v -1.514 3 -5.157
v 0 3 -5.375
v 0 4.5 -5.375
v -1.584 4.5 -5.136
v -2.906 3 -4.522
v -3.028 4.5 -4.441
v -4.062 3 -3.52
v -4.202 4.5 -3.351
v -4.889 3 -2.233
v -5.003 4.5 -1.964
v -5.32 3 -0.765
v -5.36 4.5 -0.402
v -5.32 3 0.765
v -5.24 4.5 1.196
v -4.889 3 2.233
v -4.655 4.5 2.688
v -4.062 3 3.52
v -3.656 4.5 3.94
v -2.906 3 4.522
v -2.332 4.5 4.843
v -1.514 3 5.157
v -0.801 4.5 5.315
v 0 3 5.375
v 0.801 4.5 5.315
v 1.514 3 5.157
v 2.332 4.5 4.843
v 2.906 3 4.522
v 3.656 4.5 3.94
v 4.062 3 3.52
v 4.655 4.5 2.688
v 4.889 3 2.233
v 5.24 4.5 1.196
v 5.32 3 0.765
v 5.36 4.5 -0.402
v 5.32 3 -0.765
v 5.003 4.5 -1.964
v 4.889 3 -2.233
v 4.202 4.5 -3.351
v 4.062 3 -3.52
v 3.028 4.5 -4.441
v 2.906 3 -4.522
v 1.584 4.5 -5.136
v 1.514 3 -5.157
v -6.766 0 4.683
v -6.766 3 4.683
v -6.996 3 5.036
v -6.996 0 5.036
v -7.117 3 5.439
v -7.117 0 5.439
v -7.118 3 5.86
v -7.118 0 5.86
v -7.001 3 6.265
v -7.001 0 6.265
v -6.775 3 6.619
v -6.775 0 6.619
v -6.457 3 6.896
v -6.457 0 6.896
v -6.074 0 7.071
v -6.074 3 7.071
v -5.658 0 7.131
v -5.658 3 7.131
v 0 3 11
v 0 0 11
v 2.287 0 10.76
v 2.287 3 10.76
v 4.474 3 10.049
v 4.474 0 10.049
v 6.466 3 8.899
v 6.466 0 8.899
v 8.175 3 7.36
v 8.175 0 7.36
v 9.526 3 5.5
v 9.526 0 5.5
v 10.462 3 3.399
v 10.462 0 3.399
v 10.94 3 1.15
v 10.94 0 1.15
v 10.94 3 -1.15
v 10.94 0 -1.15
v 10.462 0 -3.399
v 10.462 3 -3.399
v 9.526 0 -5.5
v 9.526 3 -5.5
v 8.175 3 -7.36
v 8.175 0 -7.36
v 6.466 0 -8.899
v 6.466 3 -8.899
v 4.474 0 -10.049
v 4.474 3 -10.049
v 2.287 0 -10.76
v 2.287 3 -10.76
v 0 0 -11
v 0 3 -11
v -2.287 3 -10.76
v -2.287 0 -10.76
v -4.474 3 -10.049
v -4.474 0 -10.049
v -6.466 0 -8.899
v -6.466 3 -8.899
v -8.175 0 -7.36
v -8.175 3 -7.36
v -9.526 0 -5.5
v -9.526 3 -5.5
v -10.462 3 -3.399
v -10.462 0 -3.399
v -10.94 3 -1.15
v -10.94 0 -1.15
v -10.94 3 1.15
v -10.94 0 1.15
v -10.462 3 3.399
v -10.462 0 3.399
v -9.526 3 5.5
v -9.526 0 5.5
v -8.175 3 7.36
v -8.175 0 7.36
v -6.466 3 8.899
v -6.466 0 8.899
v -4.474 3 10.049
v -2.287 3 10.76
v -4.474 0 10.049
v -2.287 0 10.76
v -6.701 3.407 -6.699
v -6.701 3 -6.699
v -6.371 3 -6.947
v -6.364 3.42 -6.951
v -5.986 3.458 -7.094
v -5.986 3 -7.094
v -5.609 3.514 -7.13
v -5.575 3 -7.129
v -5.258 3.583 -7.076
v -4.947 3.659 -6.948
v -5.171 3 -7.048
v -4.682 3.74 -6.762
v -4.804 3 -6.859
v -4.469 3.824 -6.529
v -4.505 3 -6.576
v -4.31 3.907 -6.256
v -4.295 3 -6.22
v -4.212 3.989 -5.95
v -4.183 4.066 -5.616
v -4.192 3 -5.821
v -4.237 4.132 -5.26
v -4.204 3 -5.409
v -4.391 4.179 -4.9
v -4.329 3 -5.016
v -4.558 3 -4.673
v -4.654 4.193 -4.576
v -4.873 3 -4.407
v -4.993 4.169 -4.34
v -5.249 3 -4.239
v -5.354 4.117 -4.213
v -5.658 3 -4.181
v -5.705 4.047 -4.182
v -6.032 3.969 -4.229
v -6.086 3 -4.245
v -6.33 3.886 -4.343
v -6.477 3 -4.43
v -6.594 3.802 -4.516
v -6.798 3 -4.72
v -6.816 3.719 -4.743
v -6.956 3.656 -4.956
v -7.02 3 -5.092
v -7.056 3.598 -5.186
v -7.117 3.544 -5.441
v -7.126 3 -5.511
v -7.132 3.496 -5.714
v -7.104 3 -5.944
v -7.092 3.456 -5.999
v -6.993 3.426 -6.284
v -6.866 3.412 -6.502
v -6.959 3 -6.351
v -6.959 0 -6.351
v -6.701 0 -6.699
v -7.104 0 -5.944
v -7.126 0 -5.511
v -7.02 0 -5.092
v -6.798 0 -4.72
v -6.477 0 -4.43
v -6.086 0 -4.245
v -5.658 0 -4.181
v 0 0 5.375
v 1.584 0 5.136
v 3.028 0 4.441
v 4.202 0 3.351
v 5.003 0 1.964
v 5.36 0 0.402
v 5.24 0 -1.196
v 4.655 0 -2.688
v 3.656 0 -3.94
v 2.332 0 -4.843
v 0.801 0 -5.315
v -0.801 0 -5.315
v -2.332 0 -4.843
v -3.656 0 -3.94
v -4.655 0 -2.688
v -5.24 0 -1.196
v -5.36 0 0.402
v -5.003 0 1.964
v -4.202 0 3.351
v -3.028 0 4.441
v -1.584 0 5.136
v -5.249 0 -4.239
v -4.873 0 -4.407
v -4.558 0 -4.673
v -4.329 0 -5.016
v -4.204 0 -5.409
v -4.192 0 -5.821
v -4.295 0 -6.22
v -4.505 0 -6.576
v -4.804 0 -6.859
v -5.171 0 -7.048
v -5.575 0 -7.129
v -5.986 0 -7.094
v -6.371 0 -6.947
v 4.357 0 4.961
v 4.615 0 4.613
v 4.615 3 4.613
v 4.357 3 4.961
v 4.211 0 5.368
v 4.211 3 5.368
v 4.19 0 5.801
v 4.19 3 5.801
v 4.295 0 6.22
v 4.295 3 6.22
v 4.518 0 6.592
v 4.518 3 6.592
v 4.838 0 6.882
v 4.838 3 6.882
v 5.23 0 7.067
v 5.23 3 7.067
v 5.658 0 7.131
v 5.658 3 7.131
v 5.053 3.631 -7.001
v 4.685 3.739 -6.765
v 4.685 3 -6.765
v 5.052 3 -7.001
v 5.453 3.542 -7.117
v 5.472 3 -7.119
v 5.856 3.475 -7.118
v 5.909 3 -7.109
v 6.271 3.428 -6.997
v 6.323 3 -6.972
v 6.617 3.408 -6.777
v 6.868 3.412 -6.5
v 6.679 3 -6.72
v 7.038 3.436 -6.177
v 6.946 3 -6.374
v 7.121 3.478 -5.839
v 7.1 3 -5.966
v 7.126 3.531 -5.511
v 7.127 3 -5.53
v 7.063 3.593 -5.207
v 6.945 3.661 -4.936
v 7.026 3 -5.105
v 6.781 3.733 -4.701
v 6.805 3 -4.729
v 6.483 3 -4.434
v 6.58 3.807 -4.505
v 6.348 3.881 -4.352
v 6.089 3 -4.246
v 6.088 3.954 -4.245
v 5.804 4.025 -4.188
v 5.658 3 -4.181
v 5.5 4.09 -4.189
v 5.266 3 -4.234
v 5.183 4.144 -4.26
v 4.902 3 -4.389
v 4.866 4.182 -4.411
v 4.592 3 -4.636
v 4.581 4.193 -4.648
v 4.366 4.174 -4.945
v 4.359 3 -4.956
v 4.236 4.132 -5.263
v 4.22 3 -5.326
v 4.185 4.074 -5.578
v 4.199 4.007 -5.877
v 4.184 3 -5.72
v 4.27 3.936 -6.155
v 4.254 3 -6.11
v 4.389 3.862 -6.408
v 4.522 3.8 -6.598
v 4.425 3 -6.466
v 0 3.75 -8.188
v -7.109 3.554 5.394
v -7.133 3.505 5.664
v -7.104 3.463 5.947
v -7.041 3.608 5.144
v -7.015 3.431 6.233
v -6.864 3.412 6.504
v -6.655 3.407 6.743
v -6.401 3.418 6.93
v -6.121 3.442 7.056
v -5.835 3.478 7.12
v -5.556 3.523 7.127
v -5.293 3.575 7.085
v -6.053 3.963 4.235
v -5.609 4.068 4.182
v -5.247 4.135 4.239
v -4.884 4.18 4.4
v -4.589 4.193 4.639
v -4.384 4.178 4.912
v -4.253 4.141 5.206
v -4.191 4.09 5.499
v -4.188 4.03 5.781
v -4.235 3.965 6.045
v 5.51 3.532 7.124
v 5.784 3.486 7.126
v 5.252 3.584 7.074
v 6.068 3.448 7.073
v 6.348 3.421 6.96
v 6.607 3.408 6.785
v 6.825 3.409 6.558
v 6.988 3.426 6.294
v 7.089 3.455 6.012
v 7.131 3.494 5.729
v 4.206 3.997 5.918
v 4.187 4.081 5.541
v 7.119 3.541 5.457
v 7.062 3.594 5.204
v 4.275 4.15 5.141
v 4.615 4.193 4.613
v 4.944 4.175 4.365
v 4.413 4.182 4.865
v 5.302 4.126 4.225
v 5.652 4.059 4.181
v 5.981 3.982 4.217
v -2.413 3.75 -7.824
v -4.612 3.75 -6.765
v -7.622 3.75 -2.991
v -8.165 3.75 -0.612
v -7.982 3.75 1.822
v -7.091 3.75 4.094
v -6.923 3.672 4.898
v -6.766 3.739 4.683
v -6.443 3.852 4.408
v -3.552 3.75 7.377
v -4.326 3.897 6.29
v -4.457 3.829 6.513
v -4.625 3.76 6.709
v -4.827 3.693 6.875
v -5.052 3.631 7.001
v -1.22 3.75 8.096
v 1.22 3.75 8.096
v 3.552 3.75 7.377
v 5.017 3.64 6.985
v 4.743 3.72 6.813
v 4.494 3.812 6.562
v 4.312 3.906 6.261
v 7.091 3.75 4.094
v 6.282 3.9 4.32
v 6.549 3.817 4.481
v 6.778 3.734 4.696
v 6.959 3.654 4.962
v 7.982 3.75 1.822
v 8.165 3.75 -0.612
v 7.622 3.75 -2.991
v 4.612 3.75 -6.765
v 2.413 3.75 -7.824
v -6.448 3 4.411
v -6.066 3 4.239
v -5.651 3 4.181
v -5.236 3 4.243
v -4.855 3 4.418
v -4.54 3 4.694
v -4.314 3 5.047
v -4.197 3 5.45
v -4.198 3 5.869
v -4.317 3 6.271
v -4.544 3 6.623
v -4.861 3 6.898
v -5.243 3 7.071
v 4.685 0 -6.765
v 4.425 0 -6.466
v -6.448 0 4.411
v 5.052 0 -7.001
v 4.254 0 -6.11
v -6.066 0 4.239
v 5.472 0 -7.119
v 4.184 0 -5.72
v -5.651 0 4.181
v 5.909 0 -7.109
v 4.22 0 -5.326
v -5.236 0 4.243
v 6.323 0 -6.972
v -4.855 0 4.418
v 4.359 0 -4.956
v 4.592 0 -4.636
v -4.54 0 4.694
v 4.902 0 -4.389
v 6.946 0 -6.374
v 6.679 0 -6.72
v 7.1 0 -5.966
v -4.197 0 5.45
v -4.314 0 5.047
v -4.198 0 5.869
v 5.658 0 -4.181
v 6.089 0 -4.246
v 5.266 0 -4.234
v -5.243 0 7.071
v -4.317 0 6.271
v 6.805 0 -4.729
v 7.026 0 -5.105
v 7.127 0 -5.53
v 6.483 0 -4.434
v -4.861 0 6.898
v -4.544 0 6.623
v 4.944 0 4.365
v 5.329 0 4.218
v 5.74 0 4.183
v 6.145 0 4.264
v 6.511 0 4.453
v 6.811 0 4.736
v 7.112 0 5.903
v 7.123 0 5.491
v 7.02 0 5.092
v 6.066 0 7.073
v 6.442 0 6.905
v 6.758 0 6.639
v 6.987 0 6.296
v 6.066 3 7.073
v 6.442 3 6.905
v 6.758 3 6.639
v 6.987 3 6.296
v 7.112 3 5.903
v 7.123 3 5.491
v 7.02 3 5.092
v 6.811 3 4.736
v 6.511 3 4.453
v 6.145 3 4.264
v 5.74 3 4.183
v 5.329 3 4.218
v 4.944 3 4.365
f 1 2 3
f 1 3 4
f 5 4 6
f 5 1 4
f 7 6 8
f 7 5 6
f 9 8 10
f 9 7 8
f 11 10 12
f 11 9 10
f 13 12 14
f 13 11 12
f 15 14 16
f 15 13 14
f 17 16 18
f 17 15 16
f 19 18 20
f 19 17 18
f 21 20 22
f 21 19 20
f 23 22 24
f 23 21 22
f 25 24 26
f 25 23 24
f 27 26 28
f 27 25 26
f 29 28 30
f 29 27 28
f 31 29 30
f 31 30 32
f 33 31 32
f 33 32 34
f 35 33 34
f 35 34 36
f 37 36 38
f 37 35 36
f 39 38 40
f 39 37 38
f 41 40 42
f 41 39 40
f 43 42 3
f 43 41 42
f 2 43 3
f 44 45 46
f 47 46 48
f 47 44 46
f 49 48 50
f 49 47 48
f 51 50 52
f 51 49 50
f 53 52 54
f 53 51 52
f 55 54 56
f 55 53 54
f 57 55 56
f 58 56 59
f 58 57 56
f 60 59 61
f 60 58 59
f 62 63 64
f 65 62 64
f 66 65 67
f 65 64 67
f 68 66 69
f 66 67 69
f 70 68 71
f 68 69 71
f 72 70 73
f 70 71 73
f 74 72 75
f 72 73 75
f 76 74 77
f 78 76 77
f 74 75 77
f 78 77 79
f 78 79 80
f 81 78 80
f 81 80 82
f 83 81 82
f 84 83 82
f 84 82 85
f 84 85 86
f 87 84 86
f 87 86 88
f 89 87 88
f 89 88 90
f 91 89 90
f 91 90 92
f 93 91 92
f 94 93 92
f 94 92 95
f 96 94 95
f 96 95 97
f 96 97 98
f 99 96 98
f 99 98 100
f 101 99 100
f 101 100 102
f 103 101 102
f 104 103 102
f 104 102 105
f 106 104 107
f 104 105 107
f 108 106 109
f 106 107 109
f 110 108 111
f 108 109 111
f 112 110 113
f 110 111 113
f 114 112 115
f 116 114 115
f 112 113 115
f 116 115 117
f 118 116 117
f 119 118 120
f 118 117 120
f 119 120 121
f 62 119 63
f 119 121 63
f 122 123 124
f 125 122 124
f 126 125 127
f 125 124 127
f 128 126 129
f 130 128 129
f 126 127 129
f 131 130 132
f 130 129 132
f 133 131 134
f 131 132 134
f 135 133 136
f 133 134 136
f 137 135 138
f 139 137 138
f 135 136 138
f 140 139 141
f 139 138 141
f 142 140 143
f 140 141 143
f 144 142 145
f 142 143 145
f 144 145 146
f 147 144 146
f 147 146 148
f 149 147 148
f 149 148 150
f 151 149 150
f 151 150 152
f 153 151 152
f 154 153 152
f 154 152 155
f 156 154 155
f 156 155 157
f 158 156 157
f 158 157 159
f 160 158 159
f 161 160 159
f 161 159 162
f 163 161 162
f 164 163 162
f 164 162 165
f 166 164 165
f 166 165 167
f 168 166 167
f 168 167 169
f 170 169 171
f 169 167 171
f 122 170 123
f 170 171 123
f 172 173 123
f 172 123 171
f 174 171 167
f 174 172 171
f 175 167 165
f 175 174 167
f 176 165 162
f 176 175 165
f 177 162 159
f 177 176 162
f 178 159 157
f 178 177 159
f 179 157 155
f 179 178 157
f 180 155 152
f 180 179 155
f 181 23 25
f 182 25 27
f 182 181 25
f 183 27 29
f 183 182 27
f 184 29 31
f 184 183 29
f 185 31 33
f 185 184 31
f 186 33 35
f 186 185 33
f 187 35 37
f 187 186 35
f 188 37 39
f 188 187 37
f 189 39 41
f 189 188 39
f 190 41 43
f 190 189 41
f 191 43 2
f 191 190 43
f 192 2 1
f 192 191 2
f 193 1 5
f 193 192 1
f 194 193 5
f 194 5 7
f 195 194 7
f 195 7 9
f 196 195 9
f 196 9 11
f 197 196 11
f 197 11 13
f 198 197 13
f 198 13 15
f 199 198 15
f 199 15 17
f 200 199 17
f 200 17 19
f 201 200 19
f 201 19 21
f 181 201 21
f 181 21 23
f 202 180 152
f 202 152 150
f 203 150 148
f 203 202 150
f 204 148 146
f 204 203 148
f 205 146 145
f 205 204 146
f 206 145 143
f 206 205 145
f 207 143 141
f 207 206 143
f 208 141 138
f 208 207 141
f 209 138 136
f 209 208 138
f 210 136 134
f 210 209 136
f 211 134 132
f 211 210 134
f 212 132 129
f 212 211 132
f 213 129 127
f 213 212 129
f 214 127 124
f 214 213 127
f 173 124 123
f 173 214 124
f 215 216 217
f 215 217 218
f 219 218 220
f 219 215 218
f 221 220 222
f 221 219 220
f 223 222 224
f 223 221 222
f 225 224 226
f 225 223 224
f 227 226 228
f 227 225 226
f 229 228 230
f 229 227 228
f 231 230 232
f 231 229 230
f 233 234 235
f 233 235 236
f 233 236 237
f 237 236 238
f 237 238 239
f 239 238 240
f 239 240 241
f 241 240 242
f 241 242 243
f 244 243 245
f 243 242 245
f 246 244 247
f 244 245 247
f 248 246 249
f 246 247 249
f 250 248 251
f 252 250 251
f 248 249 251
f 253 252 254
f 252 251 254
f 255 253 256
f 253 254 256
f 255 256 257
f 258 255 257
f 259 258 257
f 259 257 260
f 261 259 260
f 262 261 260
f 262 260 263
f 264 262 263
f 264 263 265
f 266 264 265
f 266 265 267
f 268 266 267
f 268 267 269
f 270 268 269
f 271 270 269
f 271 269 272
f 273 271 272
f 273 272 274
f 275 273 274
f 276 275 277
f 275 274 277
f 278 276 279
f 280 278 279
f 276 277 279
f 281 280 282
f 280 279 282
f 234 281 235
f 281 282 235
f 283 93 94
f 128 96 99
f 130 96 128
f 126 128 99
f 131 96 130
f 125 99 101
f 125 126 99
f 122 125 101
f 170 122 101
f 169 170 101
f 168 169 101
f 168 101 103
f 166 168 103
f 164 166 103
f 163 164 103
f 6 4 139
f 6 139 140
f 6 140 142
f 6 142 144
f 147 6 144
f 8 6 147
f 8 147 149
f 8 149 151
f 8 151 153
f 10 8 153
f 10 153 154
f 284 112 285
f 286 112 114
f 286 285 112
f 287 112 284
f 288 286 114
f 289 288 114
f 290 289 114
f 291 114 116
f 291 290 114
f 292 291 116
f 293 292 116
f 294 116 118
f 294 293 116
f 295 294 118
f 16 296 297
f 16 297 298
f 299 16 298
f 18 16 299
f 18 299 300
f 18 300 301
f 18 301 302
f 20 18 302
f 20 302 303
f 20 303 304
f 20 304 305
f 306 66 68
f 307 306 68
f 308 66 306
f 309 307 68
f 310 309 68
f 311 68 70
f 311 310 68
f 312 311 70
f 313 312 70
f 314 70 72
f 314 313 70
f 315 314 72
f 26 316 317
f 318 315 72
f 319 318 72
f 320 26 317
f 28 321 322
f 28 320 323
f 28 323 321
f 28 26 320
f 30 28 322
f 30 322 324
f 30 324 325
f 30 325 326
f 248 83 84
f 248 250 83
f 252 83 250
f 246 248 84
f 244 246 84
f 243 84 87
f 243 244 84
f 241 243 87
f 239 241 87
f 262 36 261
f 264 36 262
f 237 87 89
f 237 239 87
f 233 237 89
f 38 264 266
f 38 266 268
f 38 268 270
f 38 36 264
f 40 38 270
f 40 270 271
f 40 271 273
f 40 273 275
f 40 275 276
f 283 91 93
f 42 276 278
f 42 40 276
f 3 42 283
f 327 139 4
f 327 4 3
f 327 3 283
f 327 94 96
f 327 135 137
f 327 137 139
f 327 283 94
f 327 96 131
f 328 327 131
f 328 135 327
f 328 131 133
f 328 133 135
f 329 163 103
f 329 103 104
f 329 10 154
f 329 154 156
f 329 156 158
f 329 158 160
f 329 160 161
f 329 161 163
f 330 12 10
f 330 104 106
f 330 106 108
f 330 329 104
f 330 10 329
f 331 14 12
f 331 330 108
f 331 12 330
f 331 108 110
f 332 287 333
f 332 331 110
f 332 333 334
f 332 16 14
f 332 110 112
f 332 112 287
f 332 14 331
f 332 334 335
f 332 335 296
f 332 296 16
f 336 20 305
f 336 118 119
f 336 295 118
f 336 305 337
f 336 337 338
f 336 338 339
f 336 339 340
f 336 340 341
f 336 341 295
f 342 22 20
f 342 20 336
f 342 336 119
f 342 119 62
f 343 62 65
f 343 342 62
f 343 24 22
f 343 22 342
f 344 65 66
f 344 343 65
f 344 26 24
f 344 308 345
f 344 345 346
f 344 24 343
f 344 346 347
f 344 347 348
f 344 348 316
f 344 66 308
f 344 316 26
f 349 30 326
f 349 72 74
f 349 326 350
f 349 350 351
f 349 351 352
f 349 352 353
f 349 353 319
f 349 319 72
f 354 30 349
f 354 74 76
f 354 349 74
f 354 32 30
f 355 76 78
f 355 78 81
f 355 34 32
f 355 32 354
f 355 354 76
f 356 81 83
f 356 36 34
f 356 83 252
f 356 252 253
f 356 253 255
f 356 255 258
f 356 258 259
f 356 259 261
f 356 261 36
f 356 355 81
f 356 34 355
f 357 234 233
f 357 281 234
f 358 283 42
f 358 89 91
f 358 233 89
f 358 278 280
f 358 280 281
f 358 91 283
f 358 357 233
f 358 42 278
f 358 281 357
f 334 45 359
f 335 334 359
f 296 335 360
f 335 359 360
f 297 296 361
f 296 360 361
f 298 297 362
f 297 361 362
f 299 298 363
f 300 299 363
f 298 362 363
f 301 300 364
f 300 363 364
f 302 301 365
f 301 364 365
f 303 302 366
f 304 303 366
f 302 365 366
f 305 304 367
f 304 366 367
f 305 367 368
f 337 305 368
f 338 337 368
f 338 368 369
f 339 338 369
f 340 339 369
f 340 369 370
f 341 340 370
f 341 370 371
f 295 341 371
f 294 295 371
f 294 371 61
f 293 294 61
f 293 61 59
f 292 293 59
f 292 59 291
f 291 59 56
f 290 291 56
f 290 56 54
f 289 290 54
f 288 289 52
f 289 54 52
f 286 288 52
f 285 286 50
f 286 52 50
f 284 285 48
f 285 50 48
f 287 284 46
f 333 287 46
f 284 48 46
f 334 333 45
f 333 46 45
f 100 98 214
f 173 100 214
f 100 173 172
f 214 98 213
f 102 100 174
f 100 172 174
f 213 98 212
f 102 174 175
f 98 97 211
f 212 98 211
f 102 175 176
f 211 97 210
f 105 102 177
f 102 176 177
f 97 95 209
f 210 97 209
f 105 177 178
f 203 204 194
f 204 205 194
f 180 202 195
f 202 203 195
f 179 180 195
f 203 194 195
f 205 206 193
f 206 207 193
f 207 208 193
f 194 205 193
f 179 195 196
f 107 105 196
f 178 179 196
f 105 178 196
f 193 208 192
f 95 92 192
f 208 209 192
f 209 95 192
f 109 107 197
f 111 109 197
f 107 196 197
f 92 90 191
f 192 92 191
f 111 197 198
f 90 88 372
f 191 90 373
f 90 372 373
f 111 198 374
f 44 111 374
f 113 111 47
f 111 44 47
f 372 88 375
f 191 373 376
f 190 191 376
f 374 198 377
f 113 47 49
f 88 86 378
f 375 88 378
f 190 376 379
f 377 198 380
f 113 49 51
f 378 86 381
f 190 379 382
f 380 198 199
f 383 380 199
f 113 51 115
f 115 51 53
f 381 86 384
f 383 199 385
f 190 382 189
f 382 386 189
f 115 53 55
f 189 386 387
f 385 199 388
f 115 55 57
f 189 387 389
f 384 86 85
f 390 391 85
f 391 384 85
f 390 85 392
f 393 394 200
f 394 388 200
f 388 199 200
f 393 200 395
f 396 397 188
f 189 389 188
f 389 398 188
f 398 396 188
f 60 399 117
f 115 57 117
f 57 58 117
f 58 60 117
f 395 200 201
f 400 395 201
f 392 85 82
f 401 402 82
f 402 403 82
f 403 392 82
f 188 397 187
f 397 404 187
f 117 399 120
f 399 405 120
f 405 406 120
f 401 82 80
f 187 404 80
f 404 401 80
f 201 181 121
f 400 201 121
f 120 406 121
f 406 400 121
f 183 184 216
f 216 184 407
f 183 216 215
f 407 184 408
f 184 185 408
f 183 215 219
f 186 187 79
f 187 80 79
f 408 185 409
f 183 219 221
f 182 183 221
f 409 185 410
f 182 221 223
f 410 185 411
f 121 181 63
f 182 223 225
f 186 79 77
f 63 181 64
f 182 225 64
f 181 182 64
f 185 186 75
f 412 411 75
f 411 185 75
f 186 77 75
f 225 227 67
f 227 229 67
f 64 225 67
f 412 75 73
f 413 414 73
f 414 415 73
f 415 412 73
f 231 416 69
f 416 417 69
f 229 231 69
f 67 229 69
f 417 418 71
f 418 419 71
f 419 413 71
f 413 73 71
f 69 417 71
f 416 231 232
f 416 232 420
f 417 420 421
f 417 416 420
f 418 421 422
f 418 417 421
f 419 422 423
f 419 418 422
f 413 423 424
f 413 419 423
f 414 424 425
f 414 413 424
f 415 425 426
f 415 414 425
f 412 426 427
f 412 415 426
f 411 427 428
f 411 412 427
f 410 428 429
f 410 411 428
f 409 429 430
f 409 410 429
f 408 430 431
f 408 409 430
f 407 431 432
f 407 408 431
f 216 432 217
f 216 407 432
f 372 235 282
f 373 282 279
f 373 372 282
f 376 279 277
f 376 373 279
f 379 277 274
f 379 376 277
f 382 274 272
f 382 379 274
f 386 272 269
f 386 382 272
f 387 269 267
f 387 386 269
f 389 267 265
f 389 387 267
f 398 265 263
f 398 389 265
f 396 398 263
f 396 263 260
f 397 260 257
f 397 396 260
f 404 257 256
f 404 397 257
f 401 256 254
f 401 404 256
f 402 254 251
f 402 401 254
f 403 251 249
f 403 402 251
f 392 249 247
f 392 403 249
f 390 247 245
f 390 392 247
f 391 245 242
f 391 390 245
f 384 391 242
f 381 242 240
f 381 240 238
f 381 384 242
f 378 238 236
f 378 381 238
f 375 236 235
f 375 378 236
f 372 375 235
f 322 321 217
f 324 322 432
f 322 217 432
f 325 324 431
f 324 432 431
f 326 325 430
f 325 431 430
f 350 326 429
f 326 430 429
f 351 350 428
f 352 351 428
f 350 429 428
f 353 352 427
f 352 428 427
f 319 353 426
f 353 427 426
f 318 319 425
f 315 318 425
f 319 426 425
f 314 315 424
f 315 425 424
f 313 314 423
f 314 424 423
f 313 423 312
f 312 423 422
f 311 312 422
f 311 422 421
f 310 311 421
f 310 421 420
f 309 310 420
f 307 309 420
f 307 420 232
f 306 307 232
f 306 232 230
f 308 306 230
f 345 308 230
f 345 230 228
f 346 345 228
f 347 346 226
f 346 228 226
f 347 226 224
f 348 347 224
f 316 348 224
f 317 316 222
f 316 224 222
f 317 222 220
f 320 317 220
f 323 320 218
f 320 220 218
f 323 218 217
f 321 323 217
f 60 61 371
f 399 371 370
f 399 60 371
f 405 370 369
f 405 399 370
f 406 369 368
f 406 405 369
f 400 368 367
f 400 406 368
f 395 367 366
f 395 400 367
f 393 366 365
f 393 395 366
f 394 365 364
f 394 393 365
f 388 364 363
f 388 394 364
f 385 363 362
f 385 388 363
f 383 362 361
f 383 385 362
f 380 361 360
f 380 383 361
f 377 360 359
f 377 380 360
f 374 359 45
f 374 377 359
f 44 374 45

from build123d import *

# Parameters (mm, degrees)
SKETCH1_R           = 11
SKETCH1_R_2         = 5.375
SKETCH1_R_3         = 1.475
BOSS_EXTRUDE1_DEPTH = 3
SKETCH6_R           = 1.475
CUT_EXTRUDE1_DEPTH  = 11


with BuildPart() as part:
    # Sketch1 → Boss-Extrude1 (new body)
    with BuildSketch(Plane(origin=(0, 0, 0), x_dir=(1, 0, 0), z_dir=(0, 1, 0))):
        with Locations(Location((0, 0, 0), (0, 0, 270))):
            Circle(SKETCH1_R)
        with Locations(Location((0, 0, 0), (0, 0, 270))):
            Circle(SKETCH1_R_2, mode=Mode.SUBTRACT)
        with Locations(Location((-5.657708628, -5.655999742, 0), (0, 0, 270))):
            Circle(SKETCH1_R_3, mode=Mode.SUBTRACT)
        with Locations(Location((-5.657708628, 5.655999742, 0), (0, 0, 270))):
            Circle(SKETCH1_R_3, mode=Mode.SUBTRACT)
        with Locations(Location((5.657708628, 5.655999742, 0), (0, 0, 270))):
            Circle(SKETCH1_R_3, mode=Mode.SUBTRACT)
        with Locations(Location((5.657708628, -5.655999742, 0), (0, 0, 270))):
            Circle(SKETCH1_R_3, mode=Mode.SUBTRACT)
    extrude(amount=BOSS_EXTRUDE1_DEPTH)

    # Sketch5 → Revolve1 (revolve)
    with BuildSketch(Plane(origin=(0, 0, 0), x_dir=(0, 0, -1), z_dir=(1, 0, 0))):
        Polygon((5.375, 4.5), (5.375, 3), (11, 3), align=None)
    revolve(axis=Axis((0, 0, 0), (0, 1, 0)))

    # Sketch6 → Cut-Extrude1 (cut)
    with BuildSketch(Plane.XZ):
        with Locations(Location((-5.657708628, 5.655999742, 0), (0, 0, 221.262911431))):
            Circle(SKETCH6_R)
        with Locations(Location((-5.657708628, -5.655999742, 0), (0, 0, 224.999958606))):
            Circle(SKETCH6_R)
        with Locations(Location((5.657708628, 5.655999742, 0), (0, 0, 225.00013267))):
            Circle(SKETCH6_R)
        with Locations(Location((5.657708628, -5.655999742, 0), (0, 0, 228.738417152))):
            Circle(SKETCH6_R)
    extrude(amount=-CUT_EXTRUDE1_DEPTH, mode=Mode.SUBTRACT)


solid = part.part
